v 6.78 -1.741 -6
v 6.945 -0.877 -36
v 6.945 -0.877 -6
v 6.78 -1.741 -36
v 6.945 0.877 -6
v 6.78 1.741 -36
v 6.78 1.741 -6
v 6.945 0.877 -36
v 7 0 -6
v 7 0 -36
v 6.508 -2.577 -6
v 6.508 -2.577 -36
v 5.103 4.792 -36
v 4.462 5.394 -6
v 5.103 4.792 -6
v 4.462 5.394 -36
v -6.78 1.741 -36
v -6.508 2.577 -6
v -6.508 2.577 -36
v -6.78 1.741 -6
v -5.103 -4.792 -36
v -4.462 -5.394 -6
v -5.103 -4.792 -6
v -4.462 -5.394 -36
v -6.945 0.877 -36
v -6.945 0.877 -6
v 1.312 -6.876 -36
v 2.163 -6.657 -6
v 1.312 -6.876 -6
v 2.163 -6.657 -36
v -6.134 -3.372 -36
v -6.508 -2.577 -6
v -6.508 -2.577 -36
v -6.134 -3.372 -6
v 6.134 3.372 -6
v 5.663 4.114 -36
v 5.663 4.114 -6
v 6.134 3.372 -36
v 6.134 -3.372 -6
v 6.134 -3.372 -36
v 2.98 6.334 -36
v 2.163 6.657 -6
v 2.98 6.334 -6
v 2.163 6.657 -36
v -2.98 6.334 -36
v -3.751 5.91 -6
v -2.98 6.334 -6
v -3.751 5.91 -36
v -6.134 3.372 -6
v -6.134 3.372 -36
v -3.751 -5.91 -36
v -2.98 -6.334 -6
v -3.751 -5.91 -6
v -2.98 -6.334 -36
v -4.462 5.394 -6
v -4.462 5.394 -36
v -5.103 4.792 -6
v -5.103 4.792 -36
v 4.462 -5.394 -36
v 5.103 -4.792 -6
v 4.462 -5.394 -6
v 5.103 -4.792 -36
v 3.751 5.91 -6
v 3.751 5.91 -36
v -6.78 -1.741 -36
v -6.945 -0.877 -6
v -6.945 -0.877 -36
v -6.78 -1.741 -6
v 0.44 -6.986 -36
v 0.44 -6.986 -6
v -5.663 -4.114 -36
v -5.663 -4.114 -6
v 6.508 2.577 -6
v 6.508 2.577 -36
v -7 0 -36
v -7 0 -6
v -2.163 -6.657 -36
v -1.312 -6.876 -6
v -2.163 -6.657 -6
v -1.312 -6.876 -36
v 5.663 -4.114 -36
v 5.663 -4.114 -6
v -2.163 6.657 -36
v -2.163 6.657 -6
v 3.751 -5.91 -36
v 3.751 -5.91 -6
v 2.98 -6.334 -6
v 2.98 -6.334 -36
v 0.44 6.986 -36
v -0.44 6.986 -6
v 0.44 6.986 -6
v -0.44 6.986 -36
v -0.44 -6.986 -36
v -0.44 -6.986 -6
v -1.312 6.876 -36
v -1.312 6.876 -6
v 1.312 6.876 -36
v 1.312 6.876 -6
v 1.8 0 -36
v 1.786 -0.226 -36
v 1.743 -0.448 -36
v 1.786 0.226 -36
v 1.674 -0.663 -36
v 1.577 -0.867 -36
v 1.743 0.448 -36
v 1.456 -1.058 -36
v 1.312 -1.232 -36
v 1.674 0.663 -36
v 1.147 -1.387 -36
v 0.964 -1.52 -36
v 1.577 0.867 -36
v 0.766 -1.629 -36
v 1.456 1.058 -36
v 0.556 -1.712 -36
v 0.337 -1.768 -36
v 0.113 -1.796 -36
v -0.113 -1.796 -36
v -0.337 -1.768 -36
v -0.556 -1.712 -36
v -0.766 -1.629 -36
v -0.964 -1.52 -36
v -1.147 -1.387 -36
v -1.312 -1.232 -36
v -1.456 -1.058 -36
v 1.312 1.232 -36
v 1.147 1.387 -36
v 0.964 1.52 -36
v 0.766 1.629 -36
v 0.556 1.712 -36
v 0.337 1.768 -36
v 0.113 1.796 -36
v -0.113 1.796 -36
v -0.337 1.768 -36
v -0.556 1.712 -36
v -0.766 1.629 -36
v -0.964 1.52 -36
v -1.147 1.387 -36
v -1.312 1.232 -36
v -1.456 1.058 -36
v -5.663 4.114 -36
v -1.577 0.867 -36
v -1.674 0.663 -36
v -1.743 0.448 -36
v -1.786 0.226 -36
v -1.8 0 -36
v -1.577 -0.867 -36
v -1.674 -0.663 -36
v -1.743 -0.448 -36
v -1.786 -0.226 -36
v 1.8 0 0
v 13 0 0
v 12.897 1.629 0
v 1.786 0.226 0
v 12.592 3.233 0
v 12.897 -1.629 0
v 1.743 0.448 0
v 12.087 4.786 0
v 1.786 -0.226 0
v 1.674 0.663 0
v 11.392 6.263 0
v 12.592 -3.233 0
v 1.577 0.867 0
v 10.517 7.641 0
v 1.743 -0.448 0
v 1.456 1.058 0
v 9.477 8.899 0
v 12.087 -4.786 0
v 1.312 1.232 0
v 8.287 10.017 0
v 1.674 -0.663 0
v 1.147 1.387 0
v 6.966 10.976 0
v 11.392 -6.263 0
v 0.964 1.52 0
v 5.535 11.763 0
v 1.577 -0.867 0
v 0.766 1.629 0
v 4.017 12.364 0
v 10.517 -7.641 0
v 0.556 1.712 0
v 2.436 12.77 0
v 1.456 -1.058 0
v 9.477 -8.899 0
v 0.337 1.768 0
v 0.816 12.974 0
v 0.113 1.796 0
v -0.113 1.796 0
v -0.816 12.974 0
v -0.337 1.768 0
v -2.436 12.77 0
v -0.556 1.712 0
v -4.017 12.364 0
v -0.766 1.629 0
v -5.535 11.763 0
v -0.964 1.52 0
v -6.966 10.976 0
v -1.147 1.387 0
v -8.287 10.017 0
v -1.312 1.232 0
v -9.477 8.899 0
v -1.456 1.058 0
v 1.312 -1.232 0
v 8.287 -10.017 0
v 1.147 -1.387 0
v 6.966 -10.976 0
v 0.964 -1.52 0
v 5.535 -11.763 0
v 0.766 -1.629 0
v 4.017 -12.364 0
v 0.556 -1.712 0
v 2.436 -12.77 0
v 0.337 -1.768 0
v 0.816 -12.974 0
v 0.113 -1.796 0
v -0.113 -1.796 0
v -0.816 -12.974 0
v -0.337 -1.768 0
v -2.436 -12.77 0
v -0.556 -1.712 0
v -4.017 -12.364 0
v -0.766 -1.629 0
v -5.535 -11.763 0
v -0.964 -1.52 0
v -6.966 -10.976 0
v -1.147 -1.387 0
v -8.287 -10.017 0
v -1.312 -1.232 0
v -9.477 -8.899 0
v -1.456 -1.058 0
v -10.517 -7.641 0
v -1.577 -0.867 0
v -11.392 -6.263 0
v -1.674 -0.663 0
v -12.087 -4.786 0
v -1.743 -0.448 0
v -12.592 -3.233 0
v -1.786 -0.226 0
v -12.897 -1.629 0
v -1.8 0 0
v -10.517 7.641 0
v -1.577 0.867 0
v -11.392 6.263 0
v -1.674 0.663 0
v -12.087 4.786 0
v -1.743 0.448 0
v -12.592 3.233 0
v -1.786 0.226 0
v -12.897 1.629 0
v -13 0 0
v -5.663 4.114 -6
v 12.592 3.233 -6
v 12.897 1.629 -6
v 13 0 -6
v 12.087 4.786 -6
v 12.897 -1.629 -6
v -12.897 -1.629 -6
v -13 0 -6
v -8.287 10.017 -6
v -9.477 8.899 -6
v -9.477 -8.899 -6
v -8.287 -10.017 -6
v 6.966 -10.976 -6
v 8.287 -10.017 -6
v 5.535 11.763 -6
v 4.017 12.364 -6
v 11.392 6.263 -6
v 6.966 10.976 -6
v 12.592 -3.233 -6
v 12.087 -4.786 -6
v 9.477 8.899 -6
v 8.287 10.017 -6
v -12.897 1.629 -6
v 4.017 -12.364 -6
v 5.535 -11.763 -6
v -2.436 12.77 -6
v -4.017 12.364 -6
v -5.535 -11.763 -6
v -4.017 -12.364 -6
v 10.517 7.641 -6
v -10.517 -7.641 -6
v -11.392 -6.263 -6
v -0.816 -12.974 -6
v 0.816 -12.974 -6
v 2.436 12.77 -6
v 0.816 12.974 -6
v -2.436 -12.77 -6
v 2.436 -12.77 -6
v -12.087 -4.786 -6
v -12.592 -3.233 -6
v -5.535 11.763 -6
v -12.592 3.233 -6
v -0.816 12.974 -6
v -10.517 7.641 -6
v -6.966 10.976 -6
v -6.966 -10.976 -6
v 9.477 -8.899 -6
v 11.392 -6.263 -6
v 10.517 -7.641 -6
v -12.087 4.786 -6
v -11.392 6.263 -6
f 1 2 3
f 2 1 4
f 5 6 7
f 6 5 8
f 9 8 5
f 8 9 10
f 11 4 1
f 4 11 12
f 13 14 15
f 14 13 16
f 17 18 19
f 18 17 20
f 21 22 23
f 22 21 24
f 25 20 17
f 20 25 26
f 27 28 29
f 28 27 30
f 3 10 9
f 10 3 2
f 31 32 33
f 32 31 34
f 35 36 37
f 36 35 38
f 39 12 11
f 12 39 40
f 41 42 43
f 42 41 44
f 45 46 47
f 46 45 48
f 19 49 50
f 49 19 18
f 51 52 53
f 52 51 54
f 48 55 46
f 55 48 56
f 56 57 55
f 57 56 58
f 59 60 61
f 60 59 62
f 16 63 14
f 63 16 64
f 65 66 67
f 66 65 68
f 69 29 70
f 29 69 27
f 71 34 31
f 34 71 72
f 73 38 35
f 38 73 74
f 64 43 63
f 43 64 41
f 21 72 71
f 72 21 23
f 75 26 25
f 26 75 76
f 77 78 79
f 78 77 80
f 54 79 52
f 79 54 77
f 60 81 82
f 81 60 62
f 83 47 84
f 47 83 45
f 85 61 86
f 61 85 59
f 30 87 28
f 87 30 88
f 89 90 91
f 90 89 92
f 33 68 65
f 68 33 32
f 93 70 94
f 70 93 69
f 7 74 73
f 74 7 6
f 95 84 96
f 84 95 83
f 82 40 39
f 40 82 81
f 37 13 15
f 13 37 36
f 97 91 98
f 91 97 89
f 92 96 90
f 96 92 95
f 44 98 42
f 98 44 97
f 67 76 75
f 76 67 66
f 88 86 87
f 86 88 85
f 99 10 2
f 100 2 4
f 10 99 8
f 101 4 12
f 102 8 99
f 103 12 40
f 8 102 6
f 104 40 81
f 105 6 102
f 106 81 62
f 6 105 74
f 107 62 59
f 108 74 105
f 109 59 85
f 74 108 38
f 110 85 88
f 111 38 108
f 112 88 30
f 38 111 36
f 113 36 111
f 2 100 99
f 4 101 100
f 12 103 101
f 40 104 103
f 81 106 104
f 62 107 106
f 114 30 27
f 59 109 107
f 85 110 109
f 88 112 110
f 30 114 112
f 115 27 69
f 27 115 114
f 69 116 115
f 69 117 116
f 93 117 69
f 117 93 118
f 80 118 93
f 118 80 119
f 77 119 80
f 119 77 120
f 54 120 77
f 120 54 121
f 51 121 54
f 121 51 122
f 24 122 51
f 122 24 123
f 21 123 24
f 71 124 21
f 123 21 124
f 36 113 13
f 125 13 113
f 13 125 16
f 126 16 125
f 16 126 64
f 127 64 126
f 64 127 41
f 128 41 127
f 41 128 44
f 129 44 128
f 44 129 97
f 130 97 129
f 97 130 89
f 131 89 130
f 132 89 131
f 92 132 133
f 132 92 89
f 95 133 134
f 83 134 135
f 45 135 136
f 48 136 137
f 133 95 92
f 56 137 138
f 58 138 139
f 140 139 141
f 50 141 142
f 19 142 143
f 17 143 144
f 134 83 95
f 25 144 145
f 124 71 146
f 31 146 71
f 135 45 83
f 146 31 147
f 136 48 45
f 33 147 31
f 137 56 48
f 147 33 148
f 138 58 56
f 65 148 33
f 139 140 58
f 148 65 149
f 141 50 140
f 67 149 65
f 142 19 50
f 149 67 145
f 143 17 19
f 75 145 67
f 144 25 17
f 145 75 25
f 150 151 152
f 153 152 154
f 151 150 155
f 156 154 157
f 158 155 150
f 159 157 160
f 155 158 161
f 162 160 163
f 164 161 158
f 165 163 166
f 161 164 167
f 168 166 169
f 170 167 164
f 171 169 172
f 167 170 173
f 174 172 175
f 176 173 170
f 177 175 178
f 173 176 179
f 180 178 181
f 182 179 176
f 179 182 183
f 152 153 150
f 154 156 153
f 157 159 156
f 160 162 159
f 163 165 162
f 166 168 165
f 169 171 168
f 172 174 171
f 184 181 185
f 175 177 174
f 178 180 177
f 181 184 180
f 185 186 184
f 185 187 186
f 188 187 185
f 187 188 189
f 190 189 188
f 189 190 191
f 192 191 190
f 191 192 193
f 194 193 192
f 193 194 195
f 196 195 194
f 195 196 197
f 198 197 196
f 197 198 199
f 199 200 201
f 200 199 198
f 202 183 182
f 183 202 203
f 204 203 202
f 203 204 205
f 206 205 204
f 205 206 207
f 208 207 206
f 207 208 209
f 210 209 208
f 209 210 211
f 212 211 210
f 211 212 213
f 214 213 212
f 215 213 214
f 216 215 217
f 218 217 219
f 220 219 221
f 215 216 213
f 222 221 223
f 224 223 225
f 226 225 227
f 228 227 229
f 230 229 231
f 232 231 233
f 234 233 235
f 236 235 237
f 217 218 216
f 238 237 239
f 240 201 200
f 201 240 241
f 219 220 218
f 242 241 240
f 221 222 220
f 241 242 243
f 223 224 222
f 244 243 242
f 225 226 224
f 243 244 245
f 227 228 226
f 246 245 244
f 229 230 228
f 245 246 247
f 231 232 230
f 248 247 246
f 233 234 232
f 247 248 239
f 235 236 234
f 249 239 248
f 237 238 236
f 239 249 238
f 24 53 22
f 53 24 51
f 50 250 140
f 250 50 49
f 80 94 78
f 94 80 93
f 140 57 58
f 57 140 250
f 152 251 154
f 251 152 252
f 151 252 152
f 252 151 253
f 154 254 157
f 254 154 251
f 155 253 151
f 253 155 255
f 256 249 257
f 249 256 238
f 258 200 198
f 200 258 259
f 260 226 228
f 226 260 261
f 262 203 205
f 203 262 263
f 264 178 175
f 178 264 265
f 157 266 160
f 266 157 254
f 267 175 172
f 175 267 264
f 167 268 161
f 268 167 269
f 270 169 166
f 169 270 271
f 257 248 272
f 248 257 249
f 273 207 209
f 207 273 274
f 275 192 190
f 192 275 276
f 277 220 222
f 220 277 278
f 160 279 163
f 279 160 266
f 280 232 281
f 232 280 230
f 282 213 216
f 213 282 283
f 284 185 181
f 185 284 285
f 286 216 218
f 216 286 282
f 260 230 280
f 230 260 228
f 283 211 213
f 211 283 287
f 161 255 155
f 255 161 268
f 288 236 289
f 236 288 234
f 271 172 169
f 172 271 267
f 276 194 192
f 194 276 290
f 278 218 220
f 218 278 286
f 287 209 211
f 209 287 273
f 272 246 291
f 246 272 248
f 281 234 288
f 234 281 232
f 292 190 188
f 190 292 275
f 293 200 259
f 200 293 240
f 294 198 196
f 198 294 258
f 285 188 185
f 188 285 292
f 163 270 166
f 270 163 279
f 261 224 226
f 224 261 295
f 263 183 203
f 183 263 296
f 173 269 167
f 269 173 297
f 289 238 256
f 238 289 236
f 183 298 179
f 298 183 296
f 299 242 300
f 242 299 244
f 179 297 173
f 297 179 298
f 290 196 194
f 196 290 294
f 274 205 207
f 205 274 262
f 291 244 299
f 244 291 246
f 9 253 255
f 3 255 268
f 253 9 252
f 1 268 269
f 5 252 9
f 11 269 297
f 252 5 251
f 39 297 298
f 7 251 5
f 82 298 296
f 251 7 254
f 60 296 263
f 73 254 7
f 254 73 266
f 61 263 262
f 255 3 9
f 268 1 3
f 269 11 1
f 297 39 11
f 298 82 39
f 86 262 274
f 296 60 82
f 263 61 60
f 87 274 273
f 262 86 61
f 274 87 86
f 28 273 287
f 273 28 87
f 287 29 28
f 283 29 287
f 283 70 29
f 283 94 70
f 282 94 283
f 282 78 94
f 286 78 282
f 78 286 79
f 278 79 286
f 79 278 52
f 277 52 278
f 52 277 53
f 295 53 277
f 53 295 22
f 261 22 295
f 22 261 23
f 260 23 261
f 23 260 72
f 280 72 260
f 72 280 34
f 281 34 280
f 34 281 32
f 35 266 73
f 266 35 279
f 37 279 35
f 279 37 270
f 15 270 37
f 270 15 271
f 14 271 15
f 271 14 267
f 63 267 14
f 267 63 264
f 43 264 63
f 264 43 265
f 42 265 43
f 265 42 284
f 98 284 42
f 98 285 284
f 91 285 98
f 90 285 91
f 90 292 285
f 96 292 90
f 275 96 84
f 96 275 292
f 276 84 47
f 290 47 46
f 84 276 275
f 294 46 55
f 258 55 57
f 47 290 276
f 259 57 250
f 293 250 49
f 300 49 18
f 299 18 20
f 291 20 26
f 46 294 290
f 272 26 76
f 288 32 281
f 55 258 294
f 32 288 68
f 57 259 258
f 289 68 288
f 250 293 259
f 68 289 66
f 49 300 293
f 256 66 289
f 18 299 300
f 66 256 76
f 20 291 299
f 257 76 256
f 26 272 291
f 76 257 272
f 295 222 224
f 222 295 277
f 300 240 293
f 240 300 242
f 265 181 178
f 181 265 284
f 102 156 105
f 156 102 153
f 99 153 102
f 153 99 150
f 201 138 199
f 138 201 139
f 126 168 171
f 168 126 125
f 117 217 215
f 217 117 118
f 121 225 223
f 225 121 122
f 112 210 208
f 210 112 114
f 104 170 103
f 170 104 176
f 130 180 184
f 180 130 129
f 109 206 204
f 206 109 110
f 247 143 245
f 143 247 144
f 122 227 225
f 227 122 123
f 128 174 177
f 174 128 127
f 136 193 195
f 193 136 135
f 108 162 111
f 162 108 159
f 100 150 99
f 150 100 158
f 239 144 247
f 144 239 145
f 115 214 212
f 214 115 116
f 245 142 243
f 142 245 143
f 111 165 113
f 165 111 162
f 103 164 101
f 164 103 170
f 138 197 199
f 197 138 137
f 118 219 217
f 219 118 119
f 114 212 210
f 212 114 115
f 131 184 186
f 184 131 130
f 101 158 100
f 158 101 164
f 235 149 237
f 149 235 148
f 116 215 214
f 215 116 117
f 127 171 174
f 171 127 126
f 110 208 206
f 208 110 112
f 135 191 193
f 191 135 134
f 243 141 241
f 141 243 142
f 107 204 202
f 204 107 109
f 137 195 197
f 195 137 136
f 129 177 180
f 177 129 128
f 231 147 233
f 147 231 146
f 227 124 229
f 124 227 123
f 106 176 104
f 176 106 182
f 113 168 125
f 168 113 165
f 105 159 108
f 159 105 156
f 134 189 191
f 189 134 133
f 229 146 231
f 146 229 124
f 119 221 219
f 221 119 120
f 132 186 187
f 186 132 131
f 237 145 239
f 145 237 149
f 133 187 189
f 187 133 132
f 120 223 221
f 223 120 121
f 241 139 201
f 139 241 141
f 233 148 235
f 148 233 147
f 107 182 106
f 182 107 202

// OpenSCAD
$fn = 50;


difference() {
	union() {
		translate(v = [0, 0, -36.0000000000]) {
			cylinder(h = 36, r = 7.0000000000);
		}
		translate(v = [0, 0, -6.0000000000]) {
			cylinder(h = 6, r = 13.0000000000);
		}
	}
	union() {
		#translate(v = [0, 0, -36]) {
			cylinder(h = 36, r = 1.8000000000);
		}
	}
}
